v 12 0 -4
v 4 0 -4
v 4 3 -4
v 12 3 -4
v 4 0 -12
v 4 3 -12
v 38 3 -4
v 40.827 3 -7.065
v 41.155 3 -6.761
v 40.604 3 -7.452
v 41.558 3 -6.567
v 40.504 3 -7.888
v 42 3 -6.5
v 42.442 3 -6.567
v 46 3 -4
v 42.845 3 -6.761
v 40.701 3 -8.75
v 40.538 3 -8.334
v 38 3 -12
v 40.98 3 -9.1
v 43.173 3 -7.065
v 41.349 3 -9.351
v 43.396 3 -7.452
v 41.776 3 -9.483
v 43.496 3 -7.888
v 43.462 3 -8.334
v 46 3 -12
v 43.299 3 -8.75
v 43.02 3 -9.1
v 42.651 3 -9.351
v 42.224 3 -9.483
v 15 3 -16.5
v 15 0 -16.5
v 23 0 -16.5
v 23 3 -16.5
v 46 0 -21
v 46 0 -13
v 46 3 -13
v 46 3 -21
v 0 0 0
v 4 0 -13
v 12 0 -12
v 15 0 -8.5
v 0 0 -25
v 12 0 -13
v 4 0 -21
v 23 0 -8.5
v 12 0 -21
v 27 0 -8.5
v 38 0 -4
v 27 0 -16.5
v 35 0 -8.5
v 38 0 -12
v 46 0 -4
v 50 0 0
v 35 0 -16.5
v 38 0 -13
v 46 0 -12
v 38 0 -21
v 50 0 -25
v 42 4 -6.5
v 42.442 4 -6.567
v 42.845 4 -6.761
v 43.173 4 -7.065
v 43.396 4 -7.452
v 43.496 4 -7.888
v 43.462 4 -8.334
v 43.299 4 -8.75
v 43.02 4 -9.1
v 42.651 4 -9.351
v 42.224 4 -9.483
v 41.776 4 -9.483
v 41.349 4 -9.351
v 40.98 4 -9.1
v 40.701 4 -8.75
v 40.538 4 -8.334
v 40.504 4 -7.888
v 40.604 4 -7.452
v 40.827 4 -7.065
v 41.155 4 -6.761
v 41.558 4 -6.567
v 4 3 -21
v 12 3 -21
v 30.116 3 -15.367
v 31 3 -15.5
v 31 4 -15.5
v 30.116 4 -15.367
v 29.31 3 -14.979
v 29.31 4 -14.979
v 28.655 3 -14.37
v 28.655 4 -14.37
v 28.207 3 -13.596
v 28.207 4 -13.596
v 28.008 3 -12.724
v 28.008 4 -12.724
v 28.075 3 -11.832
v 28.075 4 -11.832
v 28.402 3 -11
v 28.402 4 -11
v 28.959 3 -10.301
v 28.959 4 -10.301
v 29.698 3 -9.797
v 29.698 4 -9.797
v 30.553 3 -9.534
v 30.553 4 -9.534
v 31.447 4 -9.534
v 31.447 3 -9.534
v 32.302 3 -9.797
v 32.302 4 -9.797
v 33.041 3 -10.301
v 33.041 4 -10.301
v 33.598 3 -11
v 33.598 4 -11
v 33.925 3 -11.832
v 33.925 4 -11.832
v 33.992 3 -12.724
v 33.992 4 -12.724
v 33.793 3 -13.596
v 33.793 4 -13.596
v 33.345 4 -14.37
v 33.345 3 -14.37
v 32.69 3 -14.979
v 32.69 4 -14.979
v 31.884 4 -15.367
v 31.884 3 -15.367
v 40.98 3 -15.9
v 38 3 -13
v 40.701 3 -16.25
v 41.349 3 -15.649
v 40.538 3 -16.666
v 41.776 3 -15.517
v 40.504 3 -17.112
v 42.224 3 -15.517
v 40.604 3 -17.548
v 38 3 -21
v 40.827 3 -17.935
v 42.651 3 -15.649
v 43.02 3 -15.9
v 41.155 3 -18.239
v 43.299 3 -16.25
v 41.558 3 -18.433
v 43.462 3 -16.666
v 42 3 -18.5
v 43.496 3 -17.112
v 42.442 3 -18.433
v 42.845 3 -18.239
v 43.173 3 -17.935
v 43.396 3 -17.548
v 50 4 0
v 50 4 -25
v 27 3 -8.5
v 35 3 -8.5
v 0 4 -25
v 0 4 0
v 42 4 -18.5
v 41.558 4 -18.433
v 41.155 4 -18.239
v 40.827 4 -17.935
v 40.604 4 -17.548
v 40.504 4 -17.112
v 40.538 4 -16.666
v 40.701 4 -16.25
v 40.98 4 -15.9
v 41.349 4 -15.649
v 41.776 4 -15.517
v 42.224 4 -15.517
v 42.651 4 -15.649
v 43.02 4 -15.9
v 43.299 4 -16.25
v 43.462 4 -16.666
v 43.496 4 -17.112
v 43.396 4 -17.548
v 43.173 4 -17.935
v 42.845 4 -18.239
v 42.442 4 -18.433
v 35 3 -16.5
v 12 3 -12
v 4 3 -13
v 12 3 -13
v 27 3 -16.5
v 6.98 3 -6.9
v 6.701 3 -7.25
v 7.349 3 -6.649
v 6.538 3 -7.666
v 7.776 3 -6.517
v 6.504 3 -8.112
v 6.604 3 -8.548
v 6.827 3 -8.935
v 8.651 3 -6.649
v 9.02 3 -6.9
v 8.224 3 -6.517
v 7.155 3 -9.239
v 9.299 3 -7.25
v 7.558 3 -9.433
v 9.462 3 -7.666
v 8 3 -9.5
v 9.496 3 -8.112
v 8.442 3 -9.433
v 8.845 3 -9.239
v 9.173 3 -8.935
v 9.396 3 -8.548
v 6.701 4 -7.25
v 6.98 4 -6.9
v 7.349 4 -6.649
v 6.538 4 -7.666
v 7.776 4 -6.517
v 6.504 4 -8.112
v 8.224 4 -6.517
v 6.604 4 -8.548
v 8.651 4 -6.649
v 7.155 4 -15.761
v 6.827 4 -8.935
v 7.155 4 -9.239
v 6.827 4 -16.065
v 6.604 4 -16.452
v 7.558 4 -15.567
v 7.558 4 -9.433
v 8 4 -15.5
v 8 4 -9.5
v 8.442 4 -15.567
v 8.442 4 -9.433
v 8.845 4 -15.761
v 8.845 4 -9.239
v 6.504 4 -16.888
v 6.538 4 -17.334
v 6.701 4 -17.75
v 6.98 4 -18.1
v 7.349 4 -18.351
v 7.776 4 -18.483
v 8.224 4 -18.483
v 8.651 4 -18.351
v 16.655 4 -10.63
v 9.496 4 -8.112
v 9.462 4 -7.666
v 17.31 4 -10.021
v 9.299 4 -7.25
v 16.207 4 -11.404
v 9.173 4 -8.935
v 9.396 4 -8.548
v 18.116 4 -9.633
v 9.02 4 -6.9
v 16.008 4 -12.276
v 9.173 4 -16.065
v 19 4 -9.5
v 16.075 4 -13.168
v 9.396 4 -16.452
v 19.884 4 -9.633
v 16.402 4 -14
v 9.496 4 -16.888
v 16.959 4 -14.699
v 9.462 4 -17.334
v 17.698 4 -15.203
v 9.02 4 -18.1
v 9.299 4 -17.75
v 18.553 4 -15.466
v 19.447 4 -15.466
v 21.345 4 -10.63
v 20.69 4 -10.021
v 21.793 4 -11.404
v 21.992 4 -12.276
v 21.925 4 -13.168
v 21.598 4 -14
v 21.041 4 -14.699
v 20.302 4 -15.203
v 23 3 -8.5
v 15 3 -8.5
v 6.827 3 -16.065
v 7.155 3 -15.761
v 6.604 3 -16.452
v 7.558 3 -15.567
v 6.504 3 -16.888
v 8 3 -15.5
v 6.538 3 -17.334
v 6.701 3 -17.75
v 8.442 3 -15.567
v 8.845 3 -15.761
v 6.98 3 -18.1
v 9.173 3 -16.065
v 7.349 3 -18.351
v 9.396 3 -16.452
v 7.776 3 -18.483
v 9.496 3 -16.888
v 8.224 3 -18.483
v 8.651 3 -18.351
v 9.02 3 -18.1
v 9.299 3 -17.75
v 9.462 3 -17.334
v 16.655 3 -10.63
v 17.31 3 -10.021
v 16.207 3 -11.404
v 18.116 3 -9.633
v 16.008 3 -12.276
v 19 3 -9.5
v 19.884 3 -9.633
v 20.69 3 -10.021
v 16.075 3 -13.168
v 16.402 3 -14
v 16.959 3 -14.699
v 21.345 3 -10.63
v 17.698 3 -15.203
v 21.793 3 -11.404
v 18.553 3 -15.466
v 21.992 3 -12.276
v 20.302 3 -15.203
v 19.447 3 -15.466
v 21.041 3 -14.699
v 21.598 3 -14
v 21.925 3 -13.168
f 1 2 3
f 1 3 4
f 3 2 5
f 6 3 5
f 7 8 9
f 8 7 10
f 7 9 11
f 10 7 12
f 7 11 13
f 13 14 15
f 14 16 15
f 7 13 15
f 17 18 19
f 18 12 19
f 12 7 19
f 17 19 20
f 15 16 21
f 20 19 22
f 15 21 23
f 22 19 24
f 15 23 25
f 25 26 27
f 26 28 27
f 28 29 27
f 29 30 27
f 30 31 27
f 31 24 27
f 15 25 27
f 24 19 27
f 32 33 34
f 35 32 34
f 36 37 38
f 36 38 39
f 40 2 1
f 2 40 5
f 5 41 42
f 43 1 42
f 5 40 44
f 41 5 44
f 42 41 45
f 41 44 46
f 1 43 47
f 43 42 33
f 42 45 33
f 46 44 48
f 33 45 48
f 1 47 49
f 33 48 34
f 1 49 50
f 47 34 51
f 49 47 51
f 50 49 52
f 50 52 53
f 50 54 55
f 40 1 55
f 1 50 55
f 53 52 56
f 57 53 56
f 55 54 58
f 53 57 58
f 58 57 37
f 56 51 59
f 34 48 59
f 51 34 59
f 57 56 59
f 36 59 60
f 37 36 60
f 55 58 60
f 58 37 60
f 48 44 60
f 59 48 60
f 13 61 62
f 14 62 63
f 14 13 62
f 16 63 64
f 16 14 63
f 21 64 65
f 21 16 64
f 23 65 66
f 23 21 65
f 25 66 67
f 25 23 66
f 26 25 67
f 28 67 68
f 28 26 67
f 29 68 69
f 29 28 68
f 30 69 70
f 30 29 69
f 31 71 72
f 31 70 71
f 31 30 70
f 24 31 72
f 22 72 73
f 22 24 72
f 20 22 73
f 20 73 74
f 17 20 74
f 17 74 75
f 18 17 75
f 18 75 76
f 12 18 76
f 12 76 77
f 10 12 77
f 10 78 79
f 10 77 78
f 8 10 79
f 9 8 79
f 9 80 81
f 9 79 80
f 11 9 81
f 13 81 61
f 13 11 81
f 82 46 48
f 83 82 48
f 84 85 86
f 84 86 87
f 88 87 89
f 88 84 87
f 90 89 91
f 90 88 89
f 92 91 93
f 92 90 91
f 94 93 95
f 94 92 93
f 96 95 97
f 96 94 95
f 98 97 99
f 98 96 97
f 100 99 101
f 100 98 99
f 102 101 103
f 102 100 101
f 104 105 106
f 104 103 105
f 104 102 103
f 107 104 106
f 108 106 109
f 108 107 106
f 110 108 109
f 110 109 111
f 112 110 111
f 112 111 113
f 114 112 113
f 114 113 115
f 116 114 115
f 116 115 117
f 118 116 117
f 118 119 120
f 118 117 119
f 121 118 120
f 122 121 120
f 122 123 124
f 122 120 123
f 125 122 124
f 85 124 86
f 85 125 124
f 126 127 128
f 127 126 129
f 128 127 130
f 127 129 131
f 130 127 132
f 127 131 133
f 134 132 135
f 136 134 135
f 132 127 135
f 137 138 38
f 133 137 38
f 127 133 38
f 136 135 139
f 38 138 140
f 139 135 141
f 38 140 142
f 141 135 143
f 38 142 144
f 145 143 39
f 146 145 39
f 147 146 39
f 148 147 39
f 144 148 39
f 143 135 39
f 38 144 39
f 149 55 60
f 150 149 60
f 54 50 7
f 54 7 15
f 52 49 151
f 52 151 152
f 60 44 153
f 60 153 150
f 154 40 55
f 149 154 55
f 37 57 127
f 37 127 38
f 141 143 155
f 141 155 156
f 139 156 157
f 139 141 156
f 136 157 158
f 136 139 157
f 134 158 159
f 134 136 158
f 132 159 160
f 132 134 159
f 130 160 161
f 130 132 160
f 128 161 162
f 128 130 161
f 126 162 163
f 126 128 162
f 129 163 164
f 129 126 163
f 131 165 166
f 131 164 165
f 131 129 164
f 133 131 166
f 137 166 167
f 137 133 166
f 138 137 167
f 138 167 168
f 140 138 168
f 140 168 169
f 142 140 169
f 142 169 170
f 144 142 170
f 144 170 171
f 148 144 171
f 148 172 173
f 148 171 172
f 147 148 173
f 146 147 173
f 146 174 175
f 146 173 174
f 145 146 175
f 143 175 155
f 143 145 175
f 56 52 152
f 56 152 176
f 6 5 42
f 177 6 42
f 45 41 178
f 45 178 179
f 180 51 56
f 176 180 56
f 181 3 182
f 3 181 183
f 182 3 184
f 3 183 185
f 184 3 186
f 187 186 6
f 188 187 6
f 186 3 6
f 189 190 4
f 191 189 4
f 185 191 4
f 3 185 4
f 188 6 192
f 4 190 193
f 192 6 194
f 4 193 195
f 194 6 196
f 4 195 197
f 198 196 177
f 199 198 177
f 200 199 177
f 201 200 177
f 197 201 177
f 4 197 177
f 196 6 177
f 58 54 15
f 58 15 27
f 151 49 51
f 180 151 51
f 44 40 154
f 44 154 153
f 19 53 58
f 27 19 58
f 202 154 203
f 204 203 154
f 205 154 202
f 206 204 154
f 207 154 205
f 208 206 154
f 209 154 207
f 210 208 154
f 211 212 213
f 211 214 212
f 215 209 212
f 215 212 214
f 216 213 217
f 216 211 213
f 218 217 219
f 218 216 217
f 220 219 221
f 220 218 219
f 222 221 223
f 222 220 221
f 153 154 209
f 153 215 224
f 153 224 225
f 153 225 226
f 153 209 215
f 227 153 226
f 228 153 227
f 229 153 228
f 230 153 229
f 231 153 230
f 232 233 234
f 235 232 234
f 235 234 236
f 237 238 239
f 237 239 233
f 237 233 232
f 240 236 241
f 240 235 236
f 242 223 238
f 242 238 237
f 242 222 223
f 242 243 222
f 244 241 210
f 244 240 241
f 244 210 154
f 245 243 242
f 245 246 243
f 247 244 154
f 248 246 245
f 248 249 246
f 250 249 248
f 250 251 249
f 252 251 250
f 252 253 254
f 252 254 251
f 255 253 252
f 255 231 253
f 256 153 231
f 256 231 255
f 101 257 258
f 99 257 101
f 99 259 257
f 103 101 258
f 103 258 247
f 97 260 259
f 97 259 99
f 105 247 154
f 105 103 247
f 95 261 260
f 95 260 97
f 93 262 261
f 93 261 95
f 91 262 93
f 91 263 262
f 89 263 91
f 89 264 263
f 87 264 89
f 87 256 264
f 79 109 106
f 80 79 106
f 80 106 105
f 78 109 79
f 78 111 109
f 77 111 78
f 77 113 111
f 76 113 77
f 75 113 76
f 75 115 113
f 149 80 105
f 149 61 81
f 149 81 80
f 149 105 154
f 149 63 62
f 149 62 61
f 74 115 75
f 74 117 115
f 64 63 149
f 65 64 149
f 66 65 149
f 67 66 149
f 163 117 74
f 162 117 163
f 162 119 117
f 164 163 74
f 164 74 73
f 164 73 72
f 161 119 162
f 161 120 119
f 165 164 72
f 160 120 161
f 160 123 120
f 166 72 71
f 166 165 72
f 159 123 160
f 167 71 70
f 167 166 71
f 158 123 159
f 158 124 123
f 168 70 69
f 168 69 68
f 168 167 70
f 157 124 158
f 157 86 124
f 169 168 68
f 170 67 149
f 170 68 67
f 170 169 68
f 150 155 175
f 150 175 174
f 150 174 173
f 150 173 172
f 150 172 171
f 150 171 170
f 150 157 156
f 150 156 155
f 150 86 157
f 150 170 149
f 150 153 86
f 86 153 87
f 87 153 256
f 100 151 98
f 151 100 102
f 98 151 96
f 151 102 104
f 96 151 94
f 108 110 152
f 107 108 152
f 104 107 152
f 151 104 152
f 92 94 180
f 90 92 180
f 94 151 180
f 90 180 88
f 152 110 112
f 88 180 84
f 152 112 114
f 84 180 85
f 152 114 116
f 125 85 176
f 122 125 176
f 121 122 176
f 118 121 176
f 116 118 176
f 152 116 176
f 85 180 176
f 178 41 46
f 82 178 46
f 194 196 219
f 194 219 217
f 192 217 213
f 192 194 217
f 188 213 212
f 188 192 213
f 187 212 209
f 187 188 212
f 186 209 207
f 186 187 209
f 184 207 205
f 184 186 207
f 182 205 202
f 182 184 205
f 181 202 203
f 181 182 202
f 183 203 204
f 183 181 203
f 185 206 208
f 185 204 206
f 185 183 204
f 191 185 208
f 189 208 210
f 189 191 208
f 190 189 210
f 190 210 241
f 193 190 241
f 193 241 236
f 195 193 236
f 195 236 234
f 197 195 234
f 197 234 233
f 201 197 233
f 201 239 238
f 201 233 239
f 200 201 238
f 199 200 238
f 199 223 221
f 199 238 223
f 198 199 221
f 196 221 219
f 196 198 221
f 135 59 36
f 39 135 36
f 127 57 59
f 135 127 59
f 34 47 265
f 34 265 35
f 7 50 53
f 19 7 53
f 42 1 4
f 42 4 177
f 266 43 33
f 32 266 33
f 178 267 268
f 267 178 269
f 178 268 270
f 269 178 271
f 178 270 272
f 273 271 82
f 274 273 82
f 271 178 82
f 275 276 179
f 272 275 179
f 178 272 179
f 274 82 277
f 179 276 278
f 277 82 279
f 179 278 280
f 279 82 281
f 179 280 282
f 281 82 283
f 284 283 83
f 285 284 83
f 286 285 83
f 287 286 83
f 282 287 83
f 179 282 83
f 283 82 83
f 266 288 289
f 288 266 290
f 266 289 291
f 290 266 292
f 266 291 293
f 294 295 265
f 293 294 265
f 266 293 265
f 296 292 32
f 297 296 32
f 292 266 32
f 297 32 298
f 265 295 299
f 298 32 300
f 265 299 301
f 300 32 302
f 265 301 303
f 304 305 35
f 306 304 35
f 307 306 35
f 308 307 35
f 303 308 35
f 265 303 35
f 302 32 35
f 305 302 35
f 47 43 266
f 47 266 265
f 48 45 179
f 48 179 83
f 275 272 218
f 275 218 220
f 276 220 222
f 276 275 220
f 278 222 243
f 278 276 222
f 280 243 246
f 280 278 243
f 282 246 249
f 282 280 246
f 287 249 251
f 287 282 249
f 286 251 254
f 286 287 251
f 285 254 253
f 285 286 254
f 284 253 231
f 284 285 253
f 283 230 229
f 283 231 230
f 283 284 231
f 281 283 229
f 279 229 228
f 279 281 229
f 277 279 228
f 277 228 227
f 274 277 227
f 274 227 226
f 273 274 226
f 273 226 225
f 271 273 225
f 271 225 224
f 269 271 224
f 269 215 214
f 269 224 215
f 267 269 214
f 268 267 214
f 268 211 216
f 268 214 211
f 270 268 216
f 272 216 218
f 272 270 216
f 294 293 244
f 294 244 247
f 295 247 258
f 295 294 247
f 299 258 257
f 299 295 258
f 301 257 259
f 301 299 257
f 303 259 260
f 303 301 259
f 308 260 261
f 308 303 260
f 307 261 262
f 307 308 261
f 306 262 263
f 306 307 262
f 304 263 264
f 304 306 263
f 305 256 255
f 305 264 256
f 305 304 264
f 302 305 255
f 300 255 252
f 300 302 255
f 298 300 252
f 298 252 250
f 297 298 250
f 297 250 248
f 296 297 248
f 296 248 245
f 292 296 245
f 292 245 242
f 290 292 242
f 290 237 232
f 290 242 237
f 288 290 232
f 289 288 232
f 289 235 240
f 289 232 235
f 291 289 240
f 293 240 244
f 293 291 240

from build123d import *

# Parameters (mm, degrees)
SKETCH1_W           = 50
SKETCH1_H           = 25
BOSS_EXTRUDE1_DEPTH = 4
SKETCH1_3_W         = 8
SKETCH1_3_H         = 8
SKETCH1_3_R         = 1.5
SKETCH1_3_R_2       = 3
CUT_EXTRUDE3_DEPTH  = 3
SKETCH1_4_R         = 1.5
SKETCH1_4_R_2       = 3
CUT_EXTRUDE4_DEPTH  = 57.044625077


with BuildPart() as part:
    # Sketch1 → Boss-Extrude1 (new body)
    with BuildSketch(Plane(origin=(0, 0, 0), x_dir=(1, 0, 0), z_dir=(0, 1, 0))):
        with Locations((25, 12.5)):
            Rectangle(SKETCH1_W, SKETCH1_H)
    extrude(amount=BOSS_EXTRUDE1_DEPTH)

    # Sketch1<3> → Cut-Extrude3 (cut)
    # profile 1 of 6: a face of its own
    with BuildSketch(Plane(origin=(0, 0, 0), x_dir=(1, 0, 0), z_dir=(0, 1, 0))):
        with Locations((8, 8)):
            Rectangle(SKETCH1_3_W, SKETCH1_3_H)
        with Locations((8, 8)):
            Circle(SKETCH1_3_R, mode=Mode.SUBTRACT)
    # profile 2 of 6: a face of its own
    with BuildSketch(Plane(origin=(0, 0, 0), x_dir=(1, 0, 0), z_dir=(0, 1, 0))):
        with Locations((19, 12.5)):
            Rectangle(SKETCH1_3_W, SKETCH1_3_H)
    # profile 3 of 6: a face of its own
    with BuildSketch(Plane(origin=(0, 0, 0), x_dir=(1, 0, 0), z_dir=(0, 1, 0))):
        with Locations((8, 17)):
            Rectangle(SKETCH1_3_W, SKETCH1_3_H)
    # profile 4 of 6: a face of its own
    with BuildSketch(Plane(origin=(0, 0, 0), x_dir=(1, 0, 0), z_dir=(0, 1, 0))):
        with Locations((31, 12.5)):
            Rectangle(SKETCH1_3_W, SKETCH1_3_H)
        with Locations((31, 12.5)):
            Circle(SKETCH1_3_R_2, mode=Mode.SUBTRACT)
    # profile 5 of 6: a face of its own
    with BuildSketch(Plane(origin=(0, 0, 0), x_dir=(1, 0, 0), z_dir=(0, 1, 0))):
        with Locations((42, 8)):
            Rectangle(SKETCH1_3_W, SKETCH1_3_H)
        with Locations((42, 8)):
            Circle(SKETCH1_3_R, mode=Mode.SUBTRACT)
    # profile 6 of 6: a face of its own
    with BuildSketch(Plane(origin=(0, 0, 0), x_dir=(1, 0, 0), z_dir=(0, 1, 0))):
        with Locations((42, 17)):
            Rectangle(SKETCH1_3_W, SKETCH1_3_H)
        with Locations((42, 17)):
            Circle(SKETCH1_3_R, mode=Mode.SUBTRACT)
    extrude(amount=CUT_EXTRUDE3_DEPTH, mode=Mode.SUBTRACT)

    # Sketch1<4> → Cut-Extrude4 (cut, through all)
    with BuildSketch(Plane(origin=(0, 0, 0), x_dir=(1, 0, 0), z_dir=(0, 1, 0))):
        with Locations((8, 17)):
            Circle(SKETCH1_4_R)
        with Locations((19, 12.5)):
            Circle(SKETCH1_4_R_2)
        with Locations((8, 8)):
            Circle(SKETCH1_4_R)
        with Locations((31, 12.5)):
            Circle(SKETCH1_4_R_2)
        with Locations((42, 8)):
            Circle(SKETCH1_4_R)
        with Locations((42, 17)):
            Circle(SKETCH1_4_R)
    extrude(amount=CUT_EXTRUDE4_DEPTH, mode=Mode.SUBTRACT)


solid = part.part
